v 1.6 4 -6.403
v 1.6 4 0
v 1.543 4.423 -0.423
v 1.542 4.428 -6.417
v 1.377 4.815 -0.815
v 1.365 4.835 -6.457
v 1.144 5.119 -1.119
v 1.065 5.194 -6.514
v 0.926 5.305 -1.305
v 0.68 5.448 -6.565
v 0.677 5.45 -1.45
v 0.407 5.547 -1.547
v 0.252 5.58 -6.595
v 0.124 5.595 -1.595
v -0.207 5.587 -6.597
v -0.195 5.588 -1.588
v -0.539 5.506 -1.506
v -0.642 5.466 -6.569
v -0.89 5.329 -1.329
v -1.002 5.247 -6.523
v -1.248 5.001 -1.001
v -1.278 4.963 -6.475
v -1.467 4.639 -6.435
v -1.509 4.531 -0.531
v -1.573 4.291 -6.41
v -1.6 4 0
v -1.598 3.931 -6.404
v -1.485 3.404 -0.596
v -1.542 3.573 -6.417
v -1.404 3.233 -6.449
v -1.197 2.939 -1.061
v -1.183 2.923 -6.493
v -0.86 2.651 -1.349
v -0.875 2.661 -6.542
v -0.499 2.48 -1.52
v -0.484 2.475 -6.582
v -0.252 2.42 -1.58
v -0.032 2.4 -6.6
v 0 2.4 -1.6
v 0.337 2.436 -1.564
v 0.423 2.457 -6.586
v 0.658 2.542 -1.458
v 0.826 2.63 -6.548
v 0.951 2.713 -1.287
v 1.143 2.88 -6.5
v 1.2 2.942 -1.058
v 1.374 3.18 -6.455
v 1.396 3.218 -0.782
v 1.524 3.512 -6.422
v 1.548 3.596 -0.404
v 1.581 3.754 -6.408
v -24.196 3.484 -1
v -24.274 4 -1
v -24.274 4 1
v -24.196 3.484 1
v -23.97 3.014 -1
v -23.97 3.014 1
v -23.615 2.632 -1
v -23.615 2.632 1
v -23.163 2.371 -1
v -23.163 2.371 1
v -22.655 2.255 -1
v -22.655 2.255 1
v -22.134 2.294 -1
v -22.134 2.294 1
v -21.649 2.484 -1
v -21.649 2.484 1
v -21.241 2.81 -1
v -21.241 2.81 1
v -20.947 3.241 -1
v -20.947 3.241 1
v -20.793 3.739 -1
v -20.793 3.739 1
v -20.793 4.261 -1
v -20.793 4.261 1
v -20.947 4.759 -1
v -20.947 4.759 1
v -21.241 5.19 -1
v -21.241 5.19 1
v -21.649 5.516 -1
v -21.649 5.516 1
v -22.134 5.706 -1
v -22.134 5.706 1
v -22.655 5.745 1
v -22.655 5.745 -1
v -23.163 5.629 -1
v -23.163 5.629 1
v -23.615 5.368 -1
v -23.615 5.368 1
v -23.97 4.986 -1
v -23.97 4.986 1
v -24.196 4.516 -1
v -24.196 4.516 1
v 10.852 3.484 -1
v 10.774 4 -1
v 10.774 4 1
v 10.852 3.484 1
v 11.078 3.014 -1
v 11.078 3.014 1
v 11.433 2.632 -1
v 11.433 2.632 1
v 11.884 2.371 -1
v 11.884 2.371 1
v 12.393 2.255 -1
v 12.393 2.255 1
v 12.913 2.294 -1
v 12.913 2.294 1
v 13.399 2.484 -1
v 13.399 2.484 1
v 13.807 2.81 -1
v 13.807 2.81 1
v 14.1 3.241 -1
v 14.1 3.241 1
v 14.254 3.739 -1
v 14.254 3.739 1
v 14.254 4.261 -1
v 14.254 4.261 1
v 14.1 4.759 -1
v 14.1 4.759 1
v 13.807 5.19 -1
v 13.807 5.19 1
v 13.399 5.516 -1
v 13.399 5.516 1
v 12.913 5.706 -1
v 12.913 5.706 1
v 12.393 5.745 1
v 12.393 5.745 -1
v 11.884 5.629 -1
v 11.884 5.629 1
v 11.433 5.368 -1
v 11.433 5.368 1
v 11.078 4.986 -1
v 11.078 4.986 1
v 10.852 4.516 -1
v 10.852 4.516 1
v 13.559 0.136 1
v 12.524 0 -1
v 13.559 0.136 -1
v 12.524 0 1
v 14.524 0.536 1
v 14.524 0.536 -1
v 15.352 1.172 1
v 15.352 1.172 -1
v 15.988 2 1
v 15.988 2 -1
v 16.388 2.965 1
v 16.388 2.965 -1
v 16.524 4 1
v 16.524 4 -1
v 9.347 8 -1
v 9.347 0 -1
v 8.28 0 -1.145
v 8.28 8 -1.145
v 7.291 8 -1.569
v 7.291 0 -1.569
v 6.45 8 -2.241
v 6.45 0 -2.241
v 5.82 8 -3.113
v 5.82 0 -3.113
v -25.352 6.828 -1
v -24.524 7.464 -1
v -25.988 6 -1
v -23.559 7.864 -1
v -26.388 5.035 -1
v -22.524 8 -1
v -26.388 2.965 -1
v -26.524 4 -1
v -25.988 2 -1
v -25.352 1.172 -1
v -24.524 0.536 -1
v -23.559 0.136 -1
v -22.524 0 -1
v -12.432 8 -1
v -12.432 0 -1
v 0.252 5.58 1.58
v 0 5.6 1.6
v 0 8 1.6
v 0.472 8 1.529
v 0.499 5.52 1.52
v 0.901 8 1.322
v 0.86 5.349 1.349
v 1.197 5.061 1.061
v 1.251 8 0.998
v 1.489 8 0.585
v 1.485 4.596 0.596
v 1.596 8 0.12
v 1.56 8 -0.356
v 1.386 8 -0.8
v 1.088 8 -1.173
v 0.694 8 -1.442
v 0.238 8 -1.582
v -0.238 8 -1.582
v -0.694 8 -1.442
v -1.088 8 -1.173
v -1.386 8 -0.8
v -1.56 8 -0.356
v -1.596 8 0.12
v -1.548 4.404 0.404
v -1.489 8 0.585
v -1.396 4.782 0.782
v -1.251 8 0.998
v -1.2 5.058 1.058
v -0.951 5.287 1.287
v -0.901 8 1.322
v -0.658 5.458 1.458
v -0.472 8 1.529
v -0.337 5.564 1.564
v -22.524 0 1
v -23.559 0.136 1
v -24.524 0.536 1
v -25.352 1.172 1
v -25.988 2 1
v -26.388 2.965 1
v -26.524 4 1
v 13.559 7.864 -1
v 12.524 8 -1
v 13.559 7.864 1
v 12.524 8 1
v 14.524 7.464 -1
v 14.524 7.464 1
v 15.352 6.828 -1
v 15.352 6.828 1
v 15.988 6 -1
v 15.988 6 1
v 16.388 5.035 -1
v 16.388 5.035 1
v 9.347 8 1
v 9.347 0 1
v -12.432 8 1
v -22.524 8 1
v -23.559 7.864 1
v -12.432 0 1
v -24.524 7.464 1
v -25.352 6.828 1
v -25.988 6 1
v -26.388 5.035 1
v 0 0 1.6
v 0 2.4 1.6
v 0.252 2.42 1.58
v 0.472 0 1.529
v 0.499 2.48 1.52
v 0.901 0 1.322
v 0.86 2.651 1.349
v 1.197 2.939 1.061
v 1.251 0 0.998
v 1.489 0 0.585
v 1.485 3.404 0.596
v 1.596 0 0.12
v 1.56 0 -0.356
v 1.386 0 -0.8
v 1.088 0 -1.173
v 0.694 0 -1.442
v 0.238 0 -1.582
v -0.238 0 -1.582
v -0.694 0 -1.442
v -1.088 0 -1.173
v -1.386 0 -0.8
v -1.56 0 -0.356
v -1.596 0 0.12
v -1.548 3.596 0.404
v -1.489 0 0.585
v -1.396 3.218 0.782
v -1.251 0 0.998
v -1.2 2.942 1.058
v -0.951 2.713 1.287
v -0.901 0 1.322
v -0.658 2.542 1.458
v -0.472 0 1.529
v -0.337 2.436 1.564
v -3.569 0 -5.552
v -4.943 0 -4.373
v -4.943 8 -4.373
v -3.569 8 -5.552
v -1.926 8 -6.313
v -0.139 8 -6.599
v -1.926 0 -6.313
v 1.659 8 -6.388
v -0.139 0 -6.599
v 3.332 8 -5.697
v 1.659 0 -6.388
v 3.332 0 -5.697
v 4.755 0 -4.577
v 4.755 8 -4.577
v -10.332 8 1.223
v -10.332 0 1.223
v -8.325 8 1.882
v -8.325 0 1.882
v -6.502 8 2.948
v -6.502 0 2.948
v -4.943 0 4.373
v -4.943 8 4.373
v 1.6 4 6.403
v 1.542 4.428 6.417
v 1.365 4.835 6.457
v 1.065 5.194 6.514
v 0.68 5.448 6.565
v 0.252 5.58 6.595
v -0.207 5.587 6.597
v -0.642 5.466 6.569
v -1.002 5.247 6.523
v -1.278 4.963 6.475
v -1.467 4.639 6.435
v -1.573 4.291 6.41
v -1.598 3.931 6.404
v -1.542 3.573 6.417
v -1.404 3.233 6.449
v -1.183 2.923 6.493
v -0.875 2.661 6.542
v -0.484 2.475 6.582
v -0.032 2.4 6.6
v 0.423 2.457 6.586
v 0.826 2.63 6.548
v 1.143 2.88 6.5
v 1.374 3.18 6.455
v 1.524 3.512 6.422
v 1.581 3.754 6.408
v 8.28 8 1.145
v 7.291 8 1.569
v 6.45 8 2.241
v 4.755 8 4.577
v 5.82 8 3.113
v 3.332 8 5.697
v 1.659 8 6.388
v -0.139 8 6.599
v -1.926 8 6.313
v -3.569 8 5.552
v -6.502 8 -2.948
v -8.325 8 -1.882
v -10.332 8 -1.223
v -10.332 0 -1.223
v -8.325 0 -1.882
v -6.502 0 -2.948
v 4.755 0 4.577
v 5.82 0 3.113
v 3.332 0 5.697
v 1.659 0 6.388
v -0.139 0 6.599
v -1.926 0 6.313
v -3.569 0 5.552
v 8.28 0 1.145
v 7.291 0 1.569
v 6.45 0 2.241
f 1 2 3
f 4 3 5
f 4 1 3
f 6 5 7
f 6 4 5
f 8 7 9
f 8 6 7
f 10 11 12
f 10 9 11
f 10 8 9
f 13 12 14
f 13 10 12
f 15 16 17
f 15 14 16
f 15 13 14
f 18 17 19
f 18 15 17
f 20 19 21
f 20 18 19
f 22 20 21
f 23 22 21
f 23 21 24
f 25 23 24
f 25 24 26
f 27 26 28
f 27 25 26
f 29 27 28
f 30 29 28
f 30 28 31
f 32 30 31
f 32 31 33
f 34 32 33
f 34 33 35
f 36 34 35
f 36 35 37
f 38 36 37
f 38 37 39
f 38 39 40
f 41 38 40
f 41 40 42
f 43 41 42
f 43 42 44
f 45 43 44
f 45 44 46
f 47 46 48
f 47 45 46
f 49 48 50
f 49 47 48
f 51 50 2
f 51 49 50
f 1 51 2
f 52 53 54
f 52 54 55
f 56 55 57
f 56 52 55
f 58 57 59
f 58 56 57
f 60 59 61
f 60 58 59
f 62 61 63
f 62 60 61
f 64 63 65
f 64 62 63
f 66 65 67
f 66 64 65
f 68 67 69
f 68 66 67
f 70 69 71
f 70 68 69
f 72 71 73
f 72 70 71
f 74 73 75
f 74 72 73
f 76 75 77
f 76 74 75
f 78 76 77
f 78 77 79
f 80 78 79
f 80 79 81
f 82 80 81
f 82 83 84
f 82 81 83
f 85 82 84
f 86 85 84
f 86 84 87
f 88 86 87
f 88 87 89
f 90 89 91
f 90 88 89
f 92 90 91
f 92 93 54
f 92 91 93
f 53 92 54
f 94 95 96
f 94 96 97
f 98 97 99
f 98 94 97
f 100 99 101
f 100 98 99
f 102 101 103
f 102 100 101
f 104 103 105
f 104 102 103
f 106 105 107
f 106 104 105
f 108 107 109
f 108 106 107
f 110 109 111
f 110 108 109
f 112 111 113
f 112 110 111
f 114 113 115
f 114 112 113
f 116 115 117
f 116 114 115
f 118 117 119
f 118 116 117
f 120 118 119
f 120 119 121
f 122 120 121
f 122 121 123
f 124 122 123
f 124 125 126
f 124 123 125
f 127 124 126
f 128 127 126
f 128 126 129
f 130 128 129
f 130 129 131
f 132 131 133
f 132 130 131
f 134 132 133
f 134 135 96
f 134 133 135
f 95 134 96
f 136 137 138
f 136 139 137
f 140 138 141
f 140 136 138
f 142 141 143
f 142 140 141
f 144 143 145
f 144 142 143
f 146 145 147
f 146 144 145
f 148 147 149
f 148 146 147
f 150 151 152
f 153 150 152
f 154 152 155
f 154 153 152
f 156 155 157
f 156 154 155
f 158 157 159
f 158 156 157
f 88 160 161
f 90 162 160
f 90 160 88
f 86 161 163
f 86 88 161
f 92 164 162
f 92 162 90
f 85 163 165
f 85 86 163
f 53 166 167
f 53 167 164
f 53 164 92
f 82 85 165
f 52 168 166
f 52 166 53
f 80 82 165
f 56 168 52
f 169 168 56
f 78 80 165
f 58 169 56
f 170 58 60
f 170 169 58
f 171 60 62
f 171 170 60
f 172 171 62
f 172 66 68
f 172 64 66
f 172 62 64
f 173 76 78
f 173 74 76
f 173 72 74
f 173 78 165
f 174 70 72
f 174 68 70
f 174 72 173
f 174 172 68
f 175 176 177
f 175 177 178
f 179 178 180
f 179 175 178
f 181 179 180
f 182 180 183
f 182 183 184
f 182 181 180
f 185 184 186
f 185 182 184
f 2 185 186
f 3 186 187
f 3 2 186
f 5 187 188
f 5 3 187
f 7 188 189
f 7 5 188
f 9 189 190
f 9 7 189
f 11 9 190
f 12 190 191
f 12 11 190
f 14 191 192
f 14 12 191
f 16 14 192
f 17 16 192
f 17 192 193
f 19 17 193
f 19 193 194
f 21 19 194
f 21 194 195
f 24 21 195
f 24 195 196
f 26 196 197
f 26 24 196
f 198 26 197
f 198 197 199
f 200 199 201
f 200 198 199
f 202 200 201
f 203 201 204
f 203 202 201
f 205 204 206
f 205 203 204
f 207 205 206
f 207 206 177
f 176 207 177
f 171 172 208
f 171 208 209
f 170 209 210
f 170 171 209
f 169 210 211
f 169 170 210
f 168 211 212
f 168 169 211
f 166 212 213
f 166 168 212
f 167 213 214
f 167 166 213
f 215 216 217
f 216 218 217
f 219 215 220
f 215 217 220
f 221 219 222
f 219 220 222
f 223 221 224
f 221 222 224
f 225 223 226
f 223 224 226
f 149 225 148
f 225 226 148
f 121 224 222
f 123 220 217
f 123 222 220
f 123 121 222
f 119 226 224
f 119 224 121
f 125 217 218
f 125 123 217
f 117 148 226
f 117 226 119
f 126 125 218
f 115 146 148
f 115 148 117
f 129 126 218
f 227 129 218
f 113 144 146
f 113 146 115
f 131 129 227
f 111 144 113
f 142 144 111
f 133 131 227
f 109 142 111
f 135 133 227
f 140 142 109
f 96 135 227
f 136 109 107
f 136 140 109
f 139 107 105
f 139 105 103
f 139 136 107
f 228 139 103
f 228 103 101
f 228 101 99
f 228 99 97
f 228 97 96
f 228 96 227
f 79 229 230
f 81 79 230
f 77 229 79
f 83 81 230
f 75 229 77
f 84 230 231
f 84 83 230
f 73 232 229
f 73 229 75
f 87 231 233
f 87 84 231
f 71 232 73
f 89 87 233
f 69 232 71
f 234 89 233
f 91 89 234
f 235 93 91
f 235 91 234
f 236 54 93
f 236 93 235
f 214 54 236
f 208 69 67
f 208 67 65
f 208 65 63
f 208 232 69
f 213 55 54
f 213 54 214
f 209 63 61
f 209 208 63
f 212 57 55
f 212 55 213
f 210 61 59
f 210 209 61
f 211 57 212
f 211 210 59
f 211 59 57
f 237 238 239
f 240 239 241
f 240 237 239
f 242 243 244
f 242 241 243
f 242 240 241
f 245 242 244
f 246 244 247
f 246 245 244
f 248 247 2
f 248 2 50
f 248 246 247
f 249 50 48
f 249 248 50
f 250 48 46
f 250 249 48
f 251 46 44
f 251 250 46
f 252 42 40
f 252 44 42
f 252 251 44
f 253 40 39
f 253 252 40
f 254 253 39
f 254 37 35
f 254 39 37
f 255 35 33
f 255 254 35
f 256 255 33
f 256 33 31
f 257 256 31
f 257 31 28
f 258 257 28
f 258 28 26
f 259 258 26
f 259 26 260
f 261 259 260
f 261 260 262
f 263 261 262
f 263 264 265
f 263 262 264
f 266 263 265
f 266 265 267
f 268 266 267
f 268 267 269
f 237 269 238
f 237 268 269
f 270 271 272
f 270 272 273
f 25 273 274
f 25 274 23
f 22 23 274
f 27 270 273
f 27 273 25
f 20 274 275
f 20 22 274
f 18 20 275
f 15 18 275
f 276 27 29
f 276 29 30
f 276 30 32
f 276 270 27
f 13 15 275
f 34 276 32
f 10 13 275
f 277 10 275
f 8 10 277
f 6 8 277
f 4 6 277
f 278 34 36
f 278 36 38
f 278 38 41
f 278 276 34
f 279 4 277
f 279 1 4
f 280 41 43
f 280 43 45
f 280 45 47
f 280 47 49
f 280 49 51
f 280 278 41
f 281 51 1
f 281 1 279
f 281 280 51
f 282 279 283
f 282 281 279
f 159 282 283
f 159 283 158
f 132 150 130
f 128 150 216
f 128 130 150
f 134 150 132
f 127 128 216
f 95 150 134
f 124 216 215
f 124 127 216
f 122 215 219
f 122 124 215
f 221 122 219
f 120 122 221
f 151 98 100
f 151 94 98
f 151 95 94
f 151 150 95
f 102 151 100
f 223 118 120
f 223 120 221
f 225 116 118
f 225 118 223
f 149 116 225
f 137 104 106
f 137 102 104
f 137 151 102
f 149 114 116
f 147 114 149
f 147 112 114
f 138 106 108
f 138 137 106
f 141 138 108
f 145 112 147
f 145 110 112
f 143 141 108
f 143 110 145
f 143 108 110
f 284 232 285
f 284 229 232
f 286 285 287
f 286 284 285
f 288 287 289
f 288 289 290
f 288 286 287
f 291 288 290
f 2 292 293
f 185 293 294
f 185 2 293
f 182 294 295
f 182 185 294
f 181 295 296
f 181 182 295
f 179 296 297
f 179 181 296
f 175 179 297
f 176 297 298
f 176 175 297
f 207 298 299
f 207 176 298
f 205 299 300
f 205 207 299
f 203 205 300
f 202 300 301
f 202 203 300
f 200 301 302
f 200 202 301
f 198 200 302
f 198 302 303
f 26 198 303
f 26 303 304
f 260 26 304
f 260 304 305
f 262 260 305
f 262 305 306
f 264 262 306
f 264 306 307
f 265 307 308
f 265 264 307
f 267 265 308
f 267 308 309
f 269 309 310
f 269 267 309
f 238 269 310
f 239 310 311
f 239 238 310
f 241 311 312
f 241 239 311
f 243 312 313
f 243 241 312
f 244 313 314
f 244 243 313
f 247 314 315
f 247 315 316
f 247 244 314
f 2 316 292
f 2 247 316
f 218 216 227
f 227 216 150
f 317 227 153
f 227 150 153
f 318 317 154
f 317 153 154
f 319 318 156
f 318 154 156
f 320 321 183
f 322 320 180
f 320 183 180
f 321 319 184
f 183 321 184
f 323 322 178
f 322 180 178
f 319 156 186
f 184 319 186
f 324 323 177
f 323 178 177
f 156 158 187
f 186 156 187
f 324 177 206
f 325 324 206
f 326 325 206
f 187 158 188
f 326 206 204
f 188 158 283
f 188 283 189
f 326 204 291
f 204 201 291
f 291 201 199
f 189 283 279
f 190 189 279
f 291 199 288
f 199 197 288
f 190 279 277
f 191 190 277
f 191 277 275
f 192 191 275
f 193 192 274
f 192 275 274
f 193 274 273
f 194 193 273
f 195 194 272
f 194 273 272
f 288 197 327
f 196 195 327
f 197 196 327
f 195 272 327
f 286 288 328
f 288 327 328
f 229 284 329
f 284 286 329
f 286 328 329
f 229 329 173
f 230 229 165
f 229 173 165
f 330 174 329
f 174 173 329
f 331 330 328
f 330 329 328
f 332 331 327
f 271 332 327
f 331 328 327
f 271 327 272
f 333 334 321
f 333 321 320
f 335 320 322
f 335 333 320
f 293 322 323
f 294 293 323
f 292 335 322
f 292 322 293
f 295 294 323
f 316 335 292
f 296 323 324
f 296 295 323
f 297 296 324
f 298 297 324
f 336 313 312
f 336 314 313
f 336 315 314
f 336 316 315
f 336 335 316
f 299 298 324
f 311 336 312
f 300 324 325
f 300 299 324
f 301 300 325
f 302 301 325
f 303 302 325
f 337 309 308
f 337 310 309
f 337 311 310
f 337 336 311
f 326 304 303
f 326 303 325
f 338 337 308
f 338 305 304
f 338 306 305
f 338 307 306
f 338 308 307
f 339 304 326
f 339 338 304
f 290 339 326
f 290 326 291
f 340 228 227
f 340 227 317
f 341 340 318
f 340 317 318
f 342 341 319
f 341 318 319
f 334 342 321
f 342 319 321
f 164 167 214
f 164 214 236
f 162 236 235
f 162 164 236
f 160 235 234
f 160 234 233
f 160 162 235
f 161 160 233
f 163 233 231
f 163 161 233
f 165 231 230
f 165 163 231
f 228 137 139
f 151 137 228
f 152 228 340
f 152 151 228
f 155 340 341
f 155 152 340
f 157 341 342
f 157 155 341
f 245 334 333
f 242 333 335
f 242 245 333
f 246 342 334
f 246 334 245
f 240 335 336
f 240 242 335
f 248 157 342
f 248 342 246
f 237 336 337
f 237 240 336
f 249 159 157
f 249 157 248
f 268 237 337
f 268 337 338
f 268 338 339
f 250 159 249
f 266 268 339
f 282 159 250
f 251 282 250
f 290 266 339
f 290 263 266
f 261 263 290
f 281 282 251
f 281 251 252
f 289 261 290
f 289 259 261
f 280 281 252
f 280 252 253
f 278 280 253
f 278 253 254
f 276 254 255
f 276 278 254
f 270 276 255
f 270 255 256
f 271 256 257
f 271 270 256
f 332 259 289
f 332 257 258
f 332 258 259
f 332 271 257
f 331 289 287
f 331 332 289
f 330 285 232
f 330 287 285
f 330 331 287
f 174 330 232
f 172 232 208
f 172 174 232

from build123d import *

# Parameters (mm, degrees)
SKETCH1_R               = 1.6
BOSS_EXTRUDE1_DEPTH     = 8
CUT_EXTRUDE1_DEPTH      = 29.727549545
CUT_EXTRUDE1_DEPTH_BACK = 29.727549545
SKETCH2_R               = 1.75
SKETCH2_R_2             = 1.6
FILLET1_R               = 10
FILLET2_R               = 4
FILLET3_R               = 4


with BuildPart() as part:
    # Sketch1 → Boss-Extrude1 (new body)
    with BuildSketch(Plane(origin=(0, 0, 0), x_dir=(1, 0, 0), z_dir=(0, 1, 0))):
        with BuildLine():
            Line((-26.523802572, 1), (-6.523802572, 1))
            ThreePointArc((-6.523802572, 1), (0, 6.6), (6.523802572, 1))
            Line((6.523802572, 1), (16.523802572, 1))
            Line((16.523802572, 1), (16.523802572, -1))
            Line((16.523802572, -1), (6.523802572, -1))
            ThreePointArc((6.523802572, -1), (0, -6.6), (-6.523802572, -1))
            Line((-6.523802572, -1), (-26.523802572, -1))
            Line((-26.523802572, -1), (-26.523802572, 1))
        make_face()
        with Locations(Location((0, 0, 0), (0, 0, 270))):
            Circle(SKETCH1_R, mode=Mode.SUBTRACT)
    extrude(amount=BOSS_EXTRUDE1_DEPTH)

    # Sketch2 → Cut-Extrude1 (cut, two sides: drawn at the far end of the back side and taken through both)
    with BuildSketch(Plane.XY.offset(1).offset(-CUT_EXTRUDE1_DEPTH_BACK)):
        with BuildLine():
            ThreePointArc((-26.523802572, 4.000000071), (-25.352229672, 6.82842715), (-22.523802572, 8))
            Line((-22.523802572, 8), (-26.523802572, 8))
            Line((-26.523802572, 8), (-26.523802572, 4.000000071))
        make_face()
        with BuildLine():
            Line((-26.523802572, 0), (-22.523802572, 0))
            ThreePointArc((-22.523802572, 0), (-25.352229722, 1.171572901), (-26.523802572, 4.000000071))
            Line((-26.523802572, 4.000000071), (-26.523802572, 0))
        make_face()
        with Locations(Location((-22.523802572, 4, 0), (0, 0, 180))):
            Circle(SKETCH2_R)
        with Locations((0, 4)):
            Circle(SKETCH2_R_2)
        with Locations(Location((12.523802572, 4, 0), (0, 0, 180))):
            Circle(SKETCH2_R)
    extrude(amount=CUT_EXTRUDE1_DEPTH + CUT_EXTRUDE1_DEPTH_BACK, mode=Mode.SUBTRACT)

    # Fillet1
    fillet1_edges = [part.edges().sort_by_distance(p)[0] for p in [
        (-6.523802572, 4, 1),
        (-6.523802572, 4, -1),
    ]]
    fillet(fillet1_edges, radius=FILLET1_R)

    # Fillet2
    fillet2_edges = [part.edges().sort_by_distance(p)[0] for p in [
        (16.523802572, 0, 0),
        (16.523802572, 8, 0),
    ]]
    fillet(fillet2_edges, radius=FILLET2_R - 0.0001)  # a hair under: the kernel refuses the full size

    # Fillet3
    fillet3_edges = [part.edges().sort_by_distance(p)[0] for p in [
        (6.523802572, 4, 1),
        (6.523802572, 4, -1),
    ]]
    fillet(fillet3_edges, radius=FILLET3_R)


solid = part.part
